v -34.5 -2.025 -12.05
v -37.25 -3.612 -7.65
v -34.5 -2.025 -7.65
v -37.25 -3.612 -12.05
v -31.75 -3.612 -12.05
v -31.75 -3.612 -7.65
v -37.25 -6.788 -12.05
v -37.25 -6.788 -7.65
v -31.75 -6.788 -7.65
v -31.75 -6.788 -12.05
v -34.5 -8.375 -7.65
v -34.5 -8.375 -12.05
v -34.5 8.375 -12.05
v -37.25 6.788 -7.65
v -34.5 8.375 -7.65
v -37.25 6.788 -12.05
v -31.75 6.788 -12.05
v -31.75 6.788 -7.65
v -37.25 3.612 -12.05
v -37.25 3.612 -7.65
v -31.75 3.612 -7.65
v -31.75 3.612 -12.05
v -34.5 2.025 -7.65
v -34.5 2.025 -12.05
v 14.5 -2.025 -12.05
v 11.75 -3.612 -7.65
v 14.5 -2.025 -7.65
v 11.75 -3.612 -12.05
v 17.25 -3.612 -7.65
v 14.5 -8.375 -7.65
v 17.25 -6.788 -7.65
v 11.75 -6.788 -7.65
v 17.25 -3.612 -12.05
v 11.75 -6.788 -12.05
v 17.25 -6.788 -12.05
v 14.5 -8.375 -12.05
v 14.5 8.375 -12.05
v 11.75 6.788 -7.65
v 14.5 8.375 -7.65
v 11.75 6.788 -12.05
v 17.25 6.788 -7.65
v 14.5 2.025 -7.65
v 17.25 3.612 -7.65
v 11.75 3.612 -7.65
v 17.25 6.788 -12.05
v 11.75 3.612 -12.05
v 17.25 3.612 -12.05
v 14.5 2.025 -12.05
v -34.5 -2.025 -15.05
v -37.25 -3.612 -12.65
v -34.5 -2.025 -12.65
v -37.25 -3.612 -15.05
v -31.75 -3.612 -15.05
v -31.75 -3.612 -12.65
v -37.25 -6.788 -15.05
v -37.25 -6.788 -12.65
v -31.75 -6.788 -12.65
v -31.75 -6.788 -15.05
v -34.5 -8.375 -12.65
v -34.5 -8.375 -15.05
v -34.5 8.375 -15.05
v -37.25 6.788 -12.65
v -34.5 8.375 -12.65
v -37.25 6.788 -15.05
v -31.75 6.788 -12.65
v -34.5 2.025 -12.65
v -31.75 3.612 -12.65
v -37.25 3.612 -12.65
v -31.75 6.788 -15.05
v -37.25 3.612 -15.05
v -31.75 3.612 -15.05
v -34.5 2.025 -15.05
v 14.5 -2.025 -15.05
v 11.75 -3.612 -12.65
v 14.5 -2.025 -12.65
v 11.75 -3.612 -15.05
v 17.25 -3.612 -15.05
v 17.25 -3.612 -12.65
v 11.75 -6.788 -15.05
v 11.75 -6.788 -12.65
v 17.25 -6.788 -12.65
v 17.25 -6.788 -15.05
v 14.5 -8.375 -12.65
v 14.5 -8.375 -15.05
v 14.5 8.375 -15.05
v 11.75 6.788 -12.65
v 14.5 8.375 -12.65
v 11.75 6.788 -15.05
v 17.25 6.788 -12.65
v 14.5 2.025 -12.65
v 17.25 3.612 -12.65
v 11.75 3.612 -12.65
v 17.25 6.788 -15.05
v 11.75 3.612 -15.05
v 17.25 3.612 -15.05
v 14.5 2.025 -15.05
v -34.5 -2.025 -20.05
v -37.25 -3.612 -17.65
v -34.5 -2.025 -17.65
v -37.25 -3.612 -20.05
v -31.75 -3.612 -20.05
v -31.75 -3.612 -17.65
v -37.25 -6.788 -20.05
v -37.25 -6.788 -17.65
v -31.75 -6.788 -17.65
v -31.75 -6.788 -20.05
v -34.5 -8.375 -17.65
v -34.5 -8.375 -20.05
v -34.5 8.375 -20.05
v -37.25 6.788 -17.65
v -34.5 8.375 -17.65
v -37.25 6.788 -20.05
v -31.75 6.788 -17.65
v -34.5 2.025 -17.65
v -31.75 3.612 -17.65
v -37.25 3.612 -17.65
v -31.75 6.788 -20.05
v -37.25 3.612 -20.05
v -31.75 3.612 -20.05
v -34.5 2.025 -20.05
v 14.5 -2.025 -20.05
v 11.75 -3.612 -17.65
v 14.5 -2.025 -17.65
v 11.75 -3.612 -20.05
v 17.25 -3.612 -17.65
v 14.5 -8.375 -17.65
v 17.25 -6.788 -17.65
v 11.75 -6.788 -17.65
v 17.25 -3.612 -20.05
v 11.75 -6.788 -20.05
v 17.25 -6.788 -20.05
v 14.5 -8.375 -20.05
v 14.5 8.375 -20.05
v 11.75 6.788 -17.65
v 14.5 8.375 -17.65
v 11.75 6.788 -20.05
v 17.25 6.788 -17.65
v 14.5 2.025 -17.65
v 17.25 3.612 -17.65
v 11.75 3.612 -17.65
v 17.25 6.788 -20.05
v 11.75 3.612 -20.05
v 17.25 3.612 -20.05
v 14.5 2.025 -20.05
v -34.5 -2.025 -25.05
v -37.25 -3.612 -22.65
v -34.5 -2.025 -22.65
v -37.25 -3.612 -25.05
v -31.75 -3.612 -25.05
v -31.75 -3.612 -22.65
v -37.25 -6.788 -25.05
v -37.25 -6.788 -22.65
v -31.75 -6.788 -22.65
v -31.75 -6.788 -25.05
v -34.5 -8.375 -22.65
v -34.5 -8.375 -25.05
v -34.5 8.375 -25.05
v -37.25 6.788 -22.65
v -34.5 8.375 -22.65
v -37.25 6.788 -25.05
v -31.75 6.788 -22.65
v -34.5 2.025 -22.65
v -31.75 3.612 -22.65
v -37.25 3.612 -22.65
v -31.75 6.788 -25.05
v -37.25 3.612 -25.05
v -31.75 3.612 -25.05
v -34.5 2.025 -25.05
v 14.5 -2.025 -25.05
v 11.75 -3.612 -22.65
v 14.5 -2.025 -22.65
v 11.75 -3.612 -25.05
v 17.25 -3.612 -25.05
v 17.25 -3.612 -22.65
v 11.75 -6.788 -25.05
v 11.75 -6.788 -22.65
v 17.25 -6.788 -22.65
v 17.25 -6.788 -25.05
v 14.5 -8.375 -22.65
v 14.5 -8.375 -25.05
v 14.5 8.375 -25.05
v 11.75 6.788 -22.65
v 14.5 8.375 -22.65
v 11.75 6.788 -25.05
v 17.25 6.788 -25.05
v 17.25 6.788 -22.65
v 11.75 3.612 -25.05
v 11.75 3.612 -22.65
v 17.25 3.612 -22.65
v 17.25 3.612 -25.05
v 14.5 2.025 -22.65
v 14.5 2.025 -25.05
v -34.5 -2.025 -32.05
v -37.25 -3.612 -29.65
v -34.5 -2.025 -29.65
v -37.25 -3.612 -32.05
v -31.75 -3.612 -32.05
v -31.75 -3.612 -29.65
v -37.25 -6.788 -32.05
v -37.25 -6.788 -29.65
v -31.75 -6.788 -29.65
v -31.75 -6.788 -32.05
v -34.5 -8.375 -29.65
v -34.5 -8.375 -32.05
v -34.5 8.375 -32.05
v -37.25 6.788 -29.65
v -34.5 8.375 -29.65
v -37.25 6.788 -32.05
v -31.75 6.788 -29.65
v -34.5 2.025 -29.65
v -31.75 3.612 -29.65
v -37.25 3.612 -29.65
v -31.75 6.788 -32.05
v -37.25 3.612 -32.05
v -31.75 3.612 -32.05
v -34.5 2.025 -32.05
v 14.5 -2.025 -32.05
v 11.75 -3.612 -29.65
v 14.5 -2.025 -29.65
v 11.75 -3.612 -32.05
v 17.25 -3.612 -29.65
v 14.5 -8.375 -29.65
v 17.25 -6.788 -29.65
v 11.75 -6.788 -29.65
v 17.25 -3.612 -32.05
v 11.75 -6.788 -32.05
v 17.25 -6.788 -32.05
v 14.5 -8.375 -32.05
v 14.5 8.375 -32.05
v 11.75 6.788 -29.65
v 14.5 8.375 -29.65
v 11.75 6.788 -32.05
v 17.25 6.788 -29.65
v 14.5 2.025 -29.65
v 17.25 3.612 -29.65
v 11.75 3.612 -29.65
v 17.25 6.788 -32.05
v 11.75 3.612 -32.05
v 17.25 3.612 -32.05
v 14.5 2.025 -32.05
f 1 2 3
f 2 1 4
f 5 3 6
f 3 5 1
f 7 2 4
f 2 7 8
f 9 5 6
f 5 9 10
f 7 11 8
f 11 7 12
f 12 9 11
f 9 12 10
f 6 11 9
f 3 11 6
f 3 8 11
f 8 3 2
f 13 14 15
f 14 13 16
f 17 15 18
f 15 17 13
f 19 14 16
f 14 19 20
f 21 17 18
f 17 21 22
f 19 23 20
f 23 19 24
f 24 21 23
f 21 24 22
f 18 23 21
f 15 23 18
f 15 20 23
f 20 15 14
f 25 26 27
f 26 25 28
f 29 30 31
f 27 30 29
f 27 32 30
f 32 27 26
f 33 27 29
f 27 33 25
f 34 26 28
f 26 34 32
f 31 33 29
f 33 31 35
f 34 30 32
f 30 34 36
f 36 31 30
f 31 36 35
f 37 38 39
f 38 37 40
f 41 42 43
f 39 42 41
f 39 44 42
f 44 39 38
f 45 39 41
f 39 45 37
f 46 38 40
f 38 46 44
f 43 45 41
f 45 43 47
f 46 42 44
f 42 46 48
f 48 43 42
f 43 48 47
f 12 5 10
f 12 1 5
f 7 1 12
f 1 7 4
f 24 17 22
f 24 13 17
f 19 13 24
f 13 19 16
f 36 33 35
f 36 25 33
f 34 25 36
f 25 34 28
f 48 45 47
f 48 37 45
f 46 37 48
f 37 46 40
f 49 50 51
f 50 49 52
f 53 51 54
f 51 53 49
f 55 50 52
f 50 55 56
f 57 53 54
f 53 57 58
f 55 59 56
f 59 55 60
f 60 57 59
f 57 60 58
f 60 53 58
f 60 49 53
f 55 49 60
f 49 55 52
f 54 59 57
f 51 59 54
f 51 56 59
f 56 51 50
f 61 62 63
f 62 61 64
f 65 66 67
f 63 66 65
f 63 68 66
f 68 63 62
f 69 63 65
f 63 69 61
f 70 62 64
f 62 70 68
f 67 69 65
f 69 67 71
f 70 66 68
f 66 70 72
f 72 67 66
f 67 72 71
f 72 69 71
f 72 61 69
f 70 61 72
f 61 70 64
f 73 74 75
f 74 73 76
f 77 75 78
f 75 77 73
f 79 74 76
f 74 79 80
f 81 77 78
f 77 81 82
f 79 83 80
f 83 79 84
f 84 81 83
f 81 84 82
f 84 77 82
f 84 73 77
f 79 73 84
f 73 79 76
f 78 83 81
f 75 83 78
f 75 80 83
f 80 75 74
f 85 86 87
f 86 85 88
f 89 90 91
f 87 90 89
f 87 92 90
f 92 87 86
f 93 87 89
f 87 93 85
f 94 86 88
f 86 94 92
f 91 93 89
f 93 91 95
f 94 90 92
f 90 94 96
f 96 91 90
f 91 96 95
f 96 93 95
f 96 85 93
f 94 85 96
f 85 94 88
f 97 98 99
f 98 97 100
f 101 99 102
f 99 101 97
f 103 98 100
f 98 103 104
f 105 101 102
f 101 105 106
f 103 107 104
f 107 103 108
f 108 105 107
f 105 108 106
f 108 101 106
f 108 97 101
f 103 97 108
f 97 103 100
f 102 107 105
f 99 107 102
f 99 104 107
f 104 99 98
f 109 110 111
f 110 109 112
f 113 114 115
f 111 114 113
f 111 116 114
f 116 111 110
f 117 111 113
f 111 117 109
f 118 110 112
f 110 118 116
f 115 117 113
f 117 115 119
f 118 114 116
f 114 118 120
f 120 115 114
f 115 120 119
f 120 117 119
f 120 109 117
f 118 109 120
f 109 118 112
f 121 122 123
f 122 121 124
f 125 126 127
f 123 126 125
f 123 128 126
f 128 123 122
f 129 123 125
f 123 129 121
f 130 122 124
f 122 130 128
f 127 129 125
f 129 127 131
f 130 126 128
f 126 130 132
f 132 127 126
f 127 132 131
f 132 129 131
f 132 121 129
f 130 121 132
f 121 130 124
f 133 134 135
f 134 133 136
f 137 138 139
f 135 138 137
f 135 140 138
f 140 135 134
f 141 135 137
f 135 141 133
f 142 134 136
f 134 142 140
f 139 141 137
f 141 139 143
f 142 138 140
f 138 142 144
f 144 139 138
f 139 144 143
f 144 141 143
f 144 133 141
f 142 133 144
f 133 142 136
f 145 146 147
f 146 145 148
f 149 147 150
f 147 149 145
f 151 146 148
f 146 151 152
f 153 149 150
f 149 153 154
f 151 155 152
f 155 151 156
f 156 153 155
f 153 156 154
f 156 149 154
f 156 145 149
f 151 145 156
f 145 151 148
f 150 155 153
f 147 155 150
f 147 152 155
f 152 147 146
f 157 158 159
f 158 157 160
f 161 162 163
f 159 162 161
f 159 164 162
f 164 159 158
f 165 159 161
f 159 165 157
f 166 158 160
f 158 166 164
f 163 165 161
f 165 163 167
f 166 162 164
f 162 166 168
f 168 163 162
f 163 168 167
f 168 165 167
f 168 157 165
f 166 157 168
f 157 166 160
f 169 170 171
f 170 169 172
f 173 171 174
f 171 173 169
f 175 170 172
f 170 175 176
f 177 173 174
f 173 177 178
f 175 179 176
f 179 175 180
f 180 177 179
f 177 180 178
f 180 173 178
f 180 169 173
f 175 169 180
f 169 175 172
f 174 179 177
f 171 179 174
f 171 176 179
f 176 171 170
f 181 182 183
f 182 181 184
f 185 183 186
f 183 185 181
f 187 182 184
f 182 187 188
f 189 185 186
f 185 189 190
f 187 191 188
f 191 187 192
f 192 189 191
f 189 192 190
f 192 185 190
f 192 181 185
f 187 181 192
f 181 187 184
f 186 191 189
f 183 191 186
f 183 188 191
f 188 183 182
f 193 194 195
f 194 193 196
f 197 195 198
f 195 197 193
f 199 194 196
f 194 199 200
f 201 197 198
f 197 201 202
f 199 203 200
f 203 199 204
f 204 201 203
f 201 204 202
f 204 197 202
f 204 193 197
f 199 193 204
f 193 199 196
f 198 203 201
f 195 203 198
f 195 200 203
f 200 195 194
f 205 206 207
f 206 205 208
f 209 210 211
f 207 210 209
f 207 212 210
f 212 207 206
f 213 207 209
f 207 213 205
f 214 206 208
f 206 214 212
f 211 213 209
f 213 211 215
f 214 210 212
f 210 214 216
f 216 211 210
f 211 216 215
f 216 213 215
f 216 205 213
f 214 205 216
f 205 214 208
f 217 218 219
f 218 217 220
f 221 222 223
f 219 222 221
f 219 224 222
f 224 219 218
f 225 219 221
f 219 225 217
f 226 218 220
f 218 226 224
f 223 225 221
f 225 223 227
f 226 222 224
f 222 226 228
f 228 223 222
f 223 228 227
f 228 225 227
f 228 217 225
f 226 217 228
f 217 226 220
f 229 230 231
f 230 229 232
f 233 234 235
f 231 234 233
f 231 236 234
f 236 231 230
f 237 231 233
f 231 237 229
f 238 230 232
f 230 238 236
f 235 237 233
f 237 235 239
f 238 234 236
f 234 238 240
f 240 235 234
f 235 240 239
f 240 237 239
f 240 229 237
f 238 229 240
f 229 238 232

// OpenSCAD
$fn = 50;

difference() {
	union() {
		translate(v = [0, 0, 0]) {
			rotate(a = [0, 0, 0]) {
				difference() {
					union() {
						translate(v = [-34.5, -5.2, -10.05]) {
							rotate(a = [0, 0, 30]) {
								linear_extrude(height = 2.4) {
									polygon(points = [[3.1754264805429417, 0.0], [1.5877132402714713, 2.75], [-1.5877132402714702, 2.7500000000000004], [-3.1754264805429417, 3.888775875324659e-16], [-1.5877132402714722, -2.7499999999999996], [1.5877132402714687, -2.7500000000000013]]);
								}
							}
						}
						translate(v = [-34.5, 5.2, -10.05]) {
							rotate(a = [0, 0, 30]) {
								linear_extrude(height = 2.4) {
									polygon(points = [[3.1754264805429417, 0.0], [1.5877132402714713, 2.75], [-1.5877132402714702, 2.7500000000000004], [-3.1754264805429417, 3.888775875324659e-16], [-1.5877132402714722, -2.7499999999999996], [1.5877132402714687, -2.7500000000000013]]);
								}
							}
						}
						translate(v = [14.5, -5.2, -10.05]) {
							rotate(a = [0, 0, 30]) {
								linear_extrude(height = 2.4) {
									polygon(points = [[3.1754264805429417, 0.0], [1.5877132402714713, 2.75], [-1.5877132402714702, 2.7500000000000004], [-3.1754264805429417, 3.888775875324659e-16], [-1.5877132402714722, -2.7499999999999996], [1.5877132402714687, -2.7500000000000013]]);
								}
							}
						}
						translate(v = [14.5, 5.2, -10.05]) {
							rotate(a = [0, 0, 30]) {
								linear_extrude(height = 2.4) {
									polygon(points = [[3.1754264805429417, 0.0], [1.5877132402714713, 2.75], [-1.5877132402714702, 2.7500000000000004], [-3.1754264805429417, 3.888775875324659e-16], [-1.5877132402714722, -2.7499999999999996], [1.5877132402714687, -2.7500000000000013]]);
								}
							}
						}
					}
					union();
				}
			}
		}
		translate(v = [0, 0, 0]) {
			rotate(a = [0, 0, 0]) {
				difference() {
					union() {
						translate(v = [-34.5, -5.2, -12.05]) {
							rotate(a = [0, 0, 30]) {
								linear_extrude(height = 2.4) {
									polygon(points = [[3.1754264805429417, 0.0], [1.5877132402714713, 2.75], [-1.5877132402714702, 2.7500000000000004], [-3.1754264805429417, 3.888775875324659e-16], [-1.5877132402714722, -2.7499999999999996], [1.5877132402714687, -2.7500000000000013]]);
								}
							}
						}
						translate(v = [-34.5, 5.2, -12.05]) {
							rotate(a = [0, 0, 30]) {
								linear_extrude(height = 2.4) {
									polygon(points = [[3.1754264805429417, 0.0], [1.5877132402714713, 2.75], [-1.5877132402714702, 2.7500000000000004], [-3.1754264805429417, 3.888775875324659e-16], [-1.5877132402714722, -2.7499999999999996], [1.5877132402714687, -2.7500000000000013]]);
								}
							}
						}
						translate(v = [14.5, -5.2, -12.05]) {
							rotate(a = [0, 0, 30]) {
								linear_extrude(height = 2.4) {
									polygon(points = [[3.1754264805429417, 0.0], [1.5877132402714713, 2.75], [-1.5877132402714702, 2.7500000000000004], [-3.1754264805429417, 3.888775875324659e-16], [-1.5877132402714722, -2.7499999999999996], [1.5877132402714687, -2.7500000000000013]]);
								}
							}
						}
						translate(v = [14.5, 5.2, -12.05]) {
							rotate(a = [0, 0, 30]) {
								linear_extrude(height = 2.4) {
									polygon(points = [[3.1754264805429417, 0.0], [1.5877132402714713, 2.75], [-1.5877132402714702, 2.7500000000000004], [-3.1754264805429417, 3.888775875324659e-16], [-1.5877132402714722, -2.7499999999999996], [1.5877132402714687, -2.7500000000000013]]);
								}
							}
						}
					}
					union();
				}
			}
		}
		translate(v = [0, 0, 0]) {
			rotate(a = [0, 0, 0]) {
				difference() {
					union() {
						translate(v = [-34.5, -5.2, -15.05]) {
							rotate(a = [0, 0, 30]) {
								linear_extrude(height = 2.4) {
									polygon(points = [[3.1754264805429417, 0.0], [1.5877132402714713, 2.75], [-1.5877132402714702, 2.7500000000000004], [-3.1754264805429417, 3.888775875324659e-16], [-1.5877132402714722, -2.7499999999999996], [1.5877132402714687, -2.7500000000000013]]);
								}
							}
						}
						translate(v = [-34.5, 5.2, -15.05]) {
							rotate(a = [0, 0, 30]) {
								linear_extrude(height = 2.4) {
									polygon(points = [[3.1754264805429417, 0.0], [1.5877132402714713, 2.75], [-1.5877132402714702, 2.7500000000000004], [-3.1754264805429417, 3.888775875324659e-16], [-1.5877132402714722, -2.7499999999999996], [1.5877132402714687, -2.7500000000000013]]);
								}
							}
						}
						translate(v = [14.5, -5.2, -15.05]) {
							rotate(a = [0, 0, 30]) {
								linear_extrude(height = 2.4) {
									polygon(points = [[3.1754264805429417, 0.0], [1.5877132402714713, 2.75], [-1.5877132402714702, 2.7500000000000004], [-3.1754264805429417, 3.888775875324659e-16], [-1.5877132402714722, -2.7499999999999996], [1.5877132402714687, -2.7500000000000013]]);
								}
							}
						}
						translate(v = [14.5, 5.2, -15.05]) {
							rotate(a = [0, 0, 30]) {
								linear_extrude(height = 2.4) {
									polygon(points = [[3.1754264805429417, 0.0], [1.5877132402714713, 2.75], [-1.5877132402714702, 2.7500000000000004], [-3.1754264805429417, 3.888775875324659e-16], [-1.5877132402714722, -2.7499999999999996], [1.5877132402714687, -2.7500000000000013]]);
								}
							}
						}
					}
					union();
				}
			}
		}
		translate(v = [0, 0, 0]) {
			rotate(a = [0, 0, 0]) {
				difference() {
					union() {
						translate(v = [-34.5, -5.2, -20.05]) {
							rotate(a = [0, 0, 30]) {
								linear_extrude(height = 2.4) {
									polygon(points = [[3.1754264805429417, 0.0], [1.5877132402714713, 2.75], [-1.5877132402714702, 2.7500000000000004], [-3.1754264805429417, 3.888775875324659e-16], [-1.5877132402714722, -2.7499999999999996], [1.5877132402714687, -2.7500000000000013]]);
								}
							}
						}
						translate(v = [-34.5, 5.2, -20.05]) {
							rotate(a = [0, 0, 30]) {
								linear_extrude(height = 2.4) {
									polygon(points = [[3.1754264805429417, 0.0], [1.5877132402714713, 2.75], [-1.5877132402714702, 2.7500000000000004], [-3.1754264805429417, 3.888775875324659e-16], [-1.5877132402714722, -2.7499999999999996], [1.5877132402714687, -2.7500000000000013]]);
								}
							}
						}
						translate(v = [14.5, -5.2, -20.05]) {
							rotate(a = [0, 0, 30]) {
								linear_extrude(height = 2.4) {
									polygon(points = [[3.1754264805429417, 0.0], [1.5877132402714713, 2.75], [-1.5877132402714702, 2.7500000000000004], [-3.1754264805429417, 3.888775875324659e-16], [-1.5877132402714722, -2.7499999999999996], [1.5877132402714687, -2.7500000000000013]]);
								}
							}
						}
						translate(v = [14.5, 5.2, -20.05]) {
							rotate(a = [0, 0, 30]) {
								linear_extrude(height = 2.4) {
									polygon(points = [[3.1754264805429417, 0.0], [1.5877132402714713, 2.75], [-1.5877132402714702, 2.7500000000000004], [-3.1754264805429417, 3.888775875324659e-16], [-1.5877132402714722, -2.7499999999999996], [1.5877132402714687, -2.7500000000000013]]);
								}
							}
						}
					}
					union();
				}
			}
		}
		translate(v = [0, 0, 0]) {
			rotate(a = [0, 0, 0]) {
				difference() {
					union() {
						translate(v = [-34.5, -5.2, -25.05]) {
							rotate(a = [0, 0, 30]) {
								linear_extrude(height = 2.4) {
									polygon(points = [[3.1754264805429417, 0.0], [1.5877132402714713, 2.75], [-1.5877132402714702, 2.7500000000000004], [-3.1754264805429417, 3.888775875324659e-16], [-1.5877132402714722, -2.7499999999999996], [1.5877132402714687, -2.7500000000000013]]);
								}
							}
						}
						translate(v = [-34.5, 5.2, -25.05]) {
							rotate(a = [0, 0, 30]) {
								linear_extrude(height = 2.4) {
									polygon(points = [[3.1754264805429417, 0.0], [1.5877132402714713, 2.75], [-1.5877132402714702, 2.7500000000000004], [-3.1754264805429417, 3.888775875324659e-16], [-1.5877132402714722, -2.7499999999999996], [1.5877132402714687, -2.7500000000000013]]);
								}
							}
						}
						translate(v = [14.5, -5.2, -25.05]) {
							rotate(a = [0, 0, 30]) {
								linear_extrude(height = 2.4) {
									polygon(points = [[3.1754264805429417, 0.0], [1.5877132402714713, 2.75], [-1.5877132402714702, 2.7500000000000004], [-3.1754264805429417, 3.888775875324659e-16], [-1.5877132402714722, -2.7499999999999996], [1.5877132402714687, -2.7500000000000013]]);
								}
							}
						}
						translate(v = [14.5, 5.2, -25.05]) {
							rotate(a = [0, 0, 30]) {
								linear_extrude(height = 2.4) {
									polygon(points = [[3.1754264805429417, 0.0], [1.5877132402714713, 2.75], [-1.5877132402714702, 2.7500000000000004], [-3.1754264805429417, 3.888775875324659e-16], [-1.5877132402714722, -2.7499999999999996], [1.5877132402714687, -2.7500000000000013]]);
								}
							}
						}
					}
					union();
				}
			}
		}
		translate(v = [0, 0, 0]) {
			rotate(a = [0, 0, 0]) {
				difference() {
					union() {
						translate(v = [-34.5, -5.2, -32.05]) {
							rotate(a = [0, 0, 30]) {
								linear_extrude(height = 2.4) {
									polygon(points = [[3.1754264805429417, 0.0], [1.5877132402714713, 2.75], [-1.5877132402714702, 2.7500000000000004], [-3.1754264805429417, 3.888775875324659e-16], [-1.5877132402714722, -2.7499999999999996], [1.5877132402714687, -2.7500000000000013]]);
								}
							}
						}
						translate(v = [-34.5, 5.2, -32.05]) {
							rotate(a = [0, 0, 30]) {
								linear_extrude(height = 2.4) {
									polygon(points = [[3.1754264805429417, 0.0], [1.5877132402714713, 2.75], [-1.5877132402714702, 2.7500000000000004], [-3.1754264805429417, 3.888775875324659e-16], [-1.5877132402714722, -2.7499999999999996], [1.5877132402714687, -2.7500000000000013]]);
								}
							}
						}
						translate(v = [14.5, -5.2, -32.05]) {
							rotate(a = [0, 0, 30]) {
								linear_extrude(height = 2.4) {
									polygon(points = [[3.1754264805429417, 0.0], [1.5877132402714713, 2.75], [-1.5877132402714702, 2.7500000000000004], [-3.1754264805429417, 3.888775875324659e-16], [-1.5877132402714722, -2.7499999999999996], [1.5877132402714687, -2.7500000000000013]]);
								}
							}
						}
						translate(v = [14.5, 5.2, -32.05]) {
							rotate(a = [0, 0, 30]) {
								linear_extrude(height = 2.4) {
									polygon(points = [[3.1754264805429417, 0.0], [1.5877132402714713, 2.75], [-1.5877132402714702, 2.7500000000000004], [-3.1754264805429417, 3.888775875324659e-16], [-1.5877132402714722, -2.7499999999999996], [1.5877132402714687, -2.7500000000000013]]);
								}
							}
						}
					}
					union();
				}
			}
		}
	}
	union();
}
